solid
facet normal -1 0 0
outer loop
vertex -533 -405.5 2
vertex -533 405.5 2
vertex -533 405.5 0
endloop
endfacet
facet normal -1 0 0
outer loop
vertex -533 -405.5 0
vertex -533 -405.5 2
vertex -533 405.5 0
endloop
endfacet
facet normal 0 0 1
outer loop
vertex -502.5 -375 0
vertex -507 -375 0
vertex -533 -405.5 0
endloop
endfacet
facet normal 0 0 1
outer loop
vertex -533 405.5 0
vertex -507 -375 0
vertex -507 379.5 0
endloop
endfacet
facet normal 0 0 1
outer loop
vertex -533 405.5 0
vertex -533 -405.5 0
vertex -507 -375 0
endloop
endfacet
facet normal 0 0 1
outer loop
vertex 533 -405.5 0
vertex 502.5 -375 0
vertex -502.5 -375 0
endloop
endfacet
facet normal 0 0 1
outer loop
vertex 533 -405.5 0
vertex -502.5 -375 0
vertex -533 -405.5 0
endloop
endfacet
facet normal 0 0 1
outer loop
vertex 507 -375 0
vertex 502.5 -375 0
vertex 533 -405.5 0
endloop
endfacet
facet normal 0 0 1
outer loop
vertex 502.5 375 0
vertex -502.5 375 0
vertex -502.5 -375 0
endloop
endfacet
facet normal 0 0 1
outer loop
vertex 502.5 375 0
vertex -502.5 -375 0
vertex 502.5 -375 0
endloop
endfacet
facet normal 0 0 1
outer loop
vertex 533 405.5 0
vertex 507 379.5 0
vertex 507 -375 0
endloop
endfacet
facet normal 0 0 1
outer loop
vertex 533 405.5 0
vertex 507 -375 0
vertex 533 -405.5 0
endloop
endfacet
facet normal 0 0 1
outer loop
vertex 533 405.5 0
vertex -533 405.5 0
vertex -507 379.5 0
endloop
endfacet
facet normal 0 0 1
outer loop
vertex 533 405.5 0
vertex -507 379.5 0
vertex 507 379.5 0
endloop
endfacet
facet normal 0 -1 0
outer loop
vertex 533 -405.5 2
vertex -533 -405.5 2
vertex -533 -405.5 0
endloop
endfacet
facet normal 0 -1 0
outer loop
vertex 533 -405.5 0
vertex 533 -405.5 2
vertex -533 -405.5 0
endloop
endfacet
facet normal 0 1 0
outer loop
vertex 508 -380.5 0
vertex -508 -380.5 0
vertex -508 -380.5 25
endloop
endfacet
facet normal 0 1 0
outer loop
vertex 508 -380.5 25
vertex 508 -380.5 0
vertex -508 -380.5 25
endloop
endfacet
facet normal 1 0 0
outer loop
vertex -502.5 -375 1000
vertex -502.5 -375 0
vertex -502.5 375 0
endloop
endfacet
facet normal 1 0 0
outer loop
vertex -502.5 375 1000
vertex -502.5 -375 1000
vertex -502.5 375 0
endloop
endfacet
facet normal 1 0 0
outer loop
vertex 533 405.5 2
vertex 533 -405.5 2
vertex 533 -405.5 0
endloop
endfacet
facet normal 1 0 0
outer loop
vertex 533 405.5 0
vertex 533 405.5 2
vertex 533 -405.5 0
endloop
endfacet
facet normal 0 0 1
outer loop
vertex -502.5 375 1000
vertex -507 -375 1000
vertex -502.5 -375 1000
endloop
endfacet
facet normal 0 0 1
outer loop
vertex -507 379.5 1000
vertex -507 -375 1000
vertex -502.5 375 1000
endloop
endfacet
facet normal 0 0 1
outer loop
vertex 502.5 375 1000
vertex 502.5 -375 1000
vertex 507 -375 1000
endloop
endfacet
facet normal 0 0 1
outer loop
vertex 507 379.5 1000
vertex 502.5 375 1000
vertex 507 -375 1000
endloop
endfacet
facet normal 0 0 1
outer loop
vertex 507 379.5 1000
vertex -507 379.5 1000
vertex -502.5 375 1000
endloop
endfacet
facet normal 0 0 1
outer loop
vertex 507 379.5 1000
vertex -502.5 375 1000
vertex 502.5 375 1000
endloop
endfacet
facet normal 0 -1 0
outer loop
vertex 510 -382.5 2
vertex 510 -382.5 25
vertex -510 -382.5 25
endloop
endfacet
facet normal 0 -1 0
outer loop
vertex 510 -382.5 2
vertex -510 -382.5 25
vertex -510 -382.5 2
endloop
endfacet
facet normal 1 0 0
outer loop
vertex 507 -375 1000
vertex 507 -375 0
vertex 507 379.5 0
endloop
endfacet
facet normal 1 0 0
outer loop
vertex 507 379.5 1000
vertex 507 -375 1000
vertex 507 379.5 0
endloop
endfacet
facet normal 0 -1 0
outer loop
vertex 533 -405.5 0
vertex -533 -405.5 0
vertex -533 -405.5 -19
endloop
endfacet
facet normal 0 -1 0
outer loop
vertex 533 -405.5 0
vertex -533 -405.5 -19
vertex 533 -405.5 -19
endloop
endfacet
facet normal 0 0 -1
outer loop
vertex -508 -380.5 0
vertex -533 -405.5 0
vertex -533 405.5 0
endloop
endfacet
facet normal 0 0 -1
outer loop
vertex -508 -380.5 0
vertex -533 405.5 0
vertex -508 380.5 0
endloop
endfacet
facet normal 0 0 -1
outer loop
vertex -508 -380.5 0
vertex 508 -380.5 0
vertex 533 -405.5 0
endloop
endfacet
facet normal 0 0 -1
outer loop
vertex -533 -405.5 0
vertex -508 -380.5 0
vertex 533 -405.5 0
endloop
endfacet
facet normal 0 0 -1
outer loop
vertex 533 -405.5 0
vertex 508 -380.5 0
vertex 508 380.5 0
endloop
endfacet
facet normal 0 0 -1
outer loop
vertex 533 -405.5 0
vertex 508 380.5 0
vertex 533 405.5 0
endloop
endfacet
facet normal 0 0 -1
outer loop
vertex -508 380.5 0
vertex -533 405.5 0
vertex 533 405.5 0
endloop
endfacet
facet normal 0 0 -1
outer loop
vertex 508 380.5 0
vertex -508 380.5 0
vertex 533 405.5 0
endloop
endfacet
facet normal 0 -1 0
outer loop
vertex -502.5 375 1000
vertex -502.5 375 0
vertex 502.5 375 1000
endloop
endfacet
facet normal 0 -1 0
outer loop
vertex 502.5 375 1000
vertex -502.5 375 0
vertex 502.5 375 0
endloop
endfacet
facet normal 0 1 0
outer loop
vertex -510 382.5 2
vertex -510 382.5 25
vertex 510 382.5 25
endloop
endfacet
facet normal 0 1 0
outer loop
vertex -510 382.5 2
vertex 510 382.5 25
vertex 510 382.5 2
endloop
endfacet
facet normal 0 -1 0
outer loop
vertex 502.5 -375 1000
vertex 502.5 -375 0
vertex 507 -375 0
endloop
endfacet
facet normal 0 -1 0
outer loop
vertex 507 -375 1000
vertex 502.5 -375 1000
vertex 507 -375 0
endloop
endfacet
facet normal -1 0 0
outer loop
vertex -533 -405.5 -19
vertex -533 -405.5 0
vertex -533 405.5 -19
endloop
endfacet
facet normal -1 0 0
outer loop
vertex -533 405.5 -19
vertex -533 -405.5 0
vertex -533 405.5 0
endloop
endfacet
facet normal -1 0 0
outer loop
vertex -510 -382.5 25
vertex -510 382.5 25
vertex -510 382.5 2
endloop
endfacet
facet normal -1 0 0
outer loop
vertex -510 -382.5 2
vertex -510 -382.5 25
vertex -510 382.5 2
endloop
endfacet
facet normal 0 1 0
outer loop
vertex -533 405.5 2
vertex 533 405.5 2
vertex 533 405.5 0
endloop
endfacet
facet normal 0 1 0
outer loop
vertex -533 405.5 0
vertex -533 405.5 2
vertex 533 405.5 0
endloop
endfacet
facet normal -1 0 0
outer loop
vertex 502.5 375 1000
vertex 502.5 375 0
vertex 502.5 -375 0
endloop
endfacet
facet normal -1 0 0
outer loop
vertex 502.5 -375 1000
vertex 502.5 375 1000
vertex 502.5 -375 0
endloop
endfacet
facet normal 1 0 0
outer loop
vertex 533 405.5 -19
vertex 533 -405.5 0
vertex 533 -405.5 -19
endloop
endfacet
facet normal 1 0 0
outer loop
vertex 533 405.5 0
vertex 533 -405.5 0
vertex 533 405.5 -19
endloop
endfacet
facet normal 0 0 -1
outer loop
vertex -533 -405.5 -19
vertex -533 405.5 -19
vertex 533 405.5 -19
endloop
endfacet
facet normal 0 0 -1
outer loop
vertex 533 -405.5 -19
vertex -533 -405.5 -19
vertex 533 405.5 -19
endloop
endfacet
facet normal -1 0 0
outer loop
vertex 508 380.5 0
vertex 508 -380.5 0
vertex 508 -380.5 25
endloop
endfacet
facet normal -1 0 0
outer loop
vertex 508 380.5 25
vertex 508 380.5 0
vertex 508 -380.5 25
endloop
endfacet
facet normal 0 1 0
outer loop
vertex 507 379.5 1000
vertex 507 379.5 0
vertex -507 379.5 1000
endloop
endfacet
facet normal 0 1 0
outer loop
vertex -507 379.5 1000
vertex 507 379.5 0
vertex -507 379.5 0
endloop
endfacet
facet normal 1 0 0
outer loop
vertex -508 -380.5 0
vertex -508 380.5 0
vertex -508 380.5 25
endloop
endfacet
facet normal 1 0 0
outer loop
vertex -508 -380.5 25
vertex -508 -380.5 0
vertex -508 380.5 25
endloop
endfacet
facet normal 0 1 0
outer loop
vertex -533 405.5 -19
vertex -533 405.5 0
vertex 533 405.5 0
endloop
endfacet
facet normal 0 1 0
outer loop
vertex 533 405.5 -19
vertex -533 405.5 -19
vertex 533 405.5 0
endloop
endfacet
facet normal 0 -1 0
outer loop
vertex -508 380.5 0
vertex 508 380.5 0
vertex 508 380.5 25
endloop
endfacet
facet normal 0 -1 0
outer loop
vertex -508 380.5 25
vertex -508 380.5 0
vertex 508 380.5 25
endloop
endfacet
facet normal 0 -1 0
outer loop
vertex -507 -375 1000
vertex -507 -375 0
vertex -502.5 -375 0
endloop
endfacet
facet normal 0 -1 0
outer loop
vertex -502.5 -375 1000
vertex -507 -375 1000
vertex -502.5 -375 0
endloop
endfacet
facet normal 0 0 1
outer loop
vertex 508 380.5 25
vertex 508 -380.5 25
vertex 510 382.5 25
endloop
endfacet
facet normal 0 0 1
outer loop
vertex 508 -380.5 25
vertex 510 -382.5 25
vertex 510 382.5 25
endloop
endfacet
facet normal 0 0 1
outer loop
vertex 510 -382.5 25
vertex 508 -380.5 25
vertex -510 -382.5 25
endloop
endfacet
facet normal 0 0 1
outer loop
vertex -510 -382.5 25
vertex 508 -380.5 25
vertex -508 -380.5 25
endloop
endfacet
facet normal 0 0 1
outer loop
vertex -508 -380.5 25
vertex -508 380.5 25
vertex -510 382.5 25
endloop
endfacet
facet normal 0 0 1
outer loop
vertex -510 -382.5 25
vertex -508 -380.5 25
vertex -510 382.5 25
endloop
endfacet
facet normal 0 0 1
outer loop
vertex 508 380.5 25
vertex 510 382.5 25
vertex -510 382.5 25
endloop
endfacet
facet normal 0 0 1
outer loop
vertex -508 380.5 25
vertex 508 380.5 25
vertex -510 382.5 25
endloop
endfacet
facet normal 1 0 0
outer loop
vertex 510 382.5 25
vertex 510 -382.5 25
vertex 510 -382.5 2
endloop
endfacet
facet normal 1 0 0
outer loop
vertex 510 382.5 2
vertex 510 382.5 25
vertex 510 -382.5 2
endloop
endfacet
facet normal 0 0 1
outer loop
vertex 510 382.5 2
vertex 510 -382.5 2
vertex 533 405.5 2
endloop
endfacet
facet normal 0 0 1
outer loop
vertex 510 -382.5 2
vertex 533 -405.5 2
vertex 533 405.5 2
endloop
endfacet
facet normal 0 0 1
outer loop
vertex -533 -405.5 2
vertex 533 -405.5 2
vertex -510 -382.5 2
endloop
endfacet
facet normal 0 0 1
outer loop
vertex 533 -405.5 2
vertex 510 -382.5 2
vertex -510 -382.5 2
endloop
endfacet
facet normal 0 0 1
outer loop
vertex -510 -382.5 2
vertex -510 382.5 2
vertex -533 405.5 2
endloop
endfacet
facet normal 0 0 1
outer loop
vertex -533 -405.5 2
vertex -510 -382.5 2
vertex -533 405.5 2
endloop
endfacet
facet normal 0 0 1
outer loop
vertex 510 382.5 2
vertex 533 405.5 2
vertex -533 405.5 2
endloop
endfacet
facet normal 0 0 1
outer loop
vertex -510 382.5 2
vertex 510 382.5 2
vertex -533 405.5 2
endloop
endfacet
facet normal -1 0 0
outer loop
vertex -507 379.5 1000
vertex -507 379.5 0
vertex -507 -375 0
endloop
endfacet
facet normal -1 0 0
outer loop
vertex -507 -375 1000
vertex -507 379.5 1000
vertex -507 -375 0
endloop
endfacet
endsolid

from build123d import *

# Parameters (mm, degrees)
F4_W     = 1066
F4_H     = 811
F5_DEPTH = 19
F6_DEPTH = 1000


with BuildPart() as f3:
    # F3: sweep along a path in F2
    with BuildLine(Plane.XY) as f3_path:
        Line((-508, -380.5), (-508, 380.5))
        Line((-508, 380.5), (508, 380.5))
        Line((508, 380.5), (508, -380.5))
        Line((508, -380.5), (-508, -380.5))
    # F1 (on Front) → F3 (sweep)
    with BuildSketch(Plane.XZ):
        Polygon((-533, 2), (-533, 0), (-508, 0), (-508, 25), (-510, 25), (-510, 2), align=None)
    sweep(path=f3_path.line, transition=Transition.RIGHT)


with BuildPart() as f5:
    # F4 (on Top) → F5 (new body)
    with BuildSketch(Plane.XY):
        Rectangle(F4_W, F4_H)
    extrude(amount=-F5_DEPTH)

    # F0 (on Top) → F6 (join)
    with BuildSketch(Plane.XY):
        Polygon((-502.5, -375), (-502.5, 375), (502.5, 375), (502.5, -375), (507, -375), (507, 379.5), (-507, 379.5), (-507, -375), align=None)
    extrude(amount=F6_DEPTH)


solid = Compound([f3.part, f5.part])
